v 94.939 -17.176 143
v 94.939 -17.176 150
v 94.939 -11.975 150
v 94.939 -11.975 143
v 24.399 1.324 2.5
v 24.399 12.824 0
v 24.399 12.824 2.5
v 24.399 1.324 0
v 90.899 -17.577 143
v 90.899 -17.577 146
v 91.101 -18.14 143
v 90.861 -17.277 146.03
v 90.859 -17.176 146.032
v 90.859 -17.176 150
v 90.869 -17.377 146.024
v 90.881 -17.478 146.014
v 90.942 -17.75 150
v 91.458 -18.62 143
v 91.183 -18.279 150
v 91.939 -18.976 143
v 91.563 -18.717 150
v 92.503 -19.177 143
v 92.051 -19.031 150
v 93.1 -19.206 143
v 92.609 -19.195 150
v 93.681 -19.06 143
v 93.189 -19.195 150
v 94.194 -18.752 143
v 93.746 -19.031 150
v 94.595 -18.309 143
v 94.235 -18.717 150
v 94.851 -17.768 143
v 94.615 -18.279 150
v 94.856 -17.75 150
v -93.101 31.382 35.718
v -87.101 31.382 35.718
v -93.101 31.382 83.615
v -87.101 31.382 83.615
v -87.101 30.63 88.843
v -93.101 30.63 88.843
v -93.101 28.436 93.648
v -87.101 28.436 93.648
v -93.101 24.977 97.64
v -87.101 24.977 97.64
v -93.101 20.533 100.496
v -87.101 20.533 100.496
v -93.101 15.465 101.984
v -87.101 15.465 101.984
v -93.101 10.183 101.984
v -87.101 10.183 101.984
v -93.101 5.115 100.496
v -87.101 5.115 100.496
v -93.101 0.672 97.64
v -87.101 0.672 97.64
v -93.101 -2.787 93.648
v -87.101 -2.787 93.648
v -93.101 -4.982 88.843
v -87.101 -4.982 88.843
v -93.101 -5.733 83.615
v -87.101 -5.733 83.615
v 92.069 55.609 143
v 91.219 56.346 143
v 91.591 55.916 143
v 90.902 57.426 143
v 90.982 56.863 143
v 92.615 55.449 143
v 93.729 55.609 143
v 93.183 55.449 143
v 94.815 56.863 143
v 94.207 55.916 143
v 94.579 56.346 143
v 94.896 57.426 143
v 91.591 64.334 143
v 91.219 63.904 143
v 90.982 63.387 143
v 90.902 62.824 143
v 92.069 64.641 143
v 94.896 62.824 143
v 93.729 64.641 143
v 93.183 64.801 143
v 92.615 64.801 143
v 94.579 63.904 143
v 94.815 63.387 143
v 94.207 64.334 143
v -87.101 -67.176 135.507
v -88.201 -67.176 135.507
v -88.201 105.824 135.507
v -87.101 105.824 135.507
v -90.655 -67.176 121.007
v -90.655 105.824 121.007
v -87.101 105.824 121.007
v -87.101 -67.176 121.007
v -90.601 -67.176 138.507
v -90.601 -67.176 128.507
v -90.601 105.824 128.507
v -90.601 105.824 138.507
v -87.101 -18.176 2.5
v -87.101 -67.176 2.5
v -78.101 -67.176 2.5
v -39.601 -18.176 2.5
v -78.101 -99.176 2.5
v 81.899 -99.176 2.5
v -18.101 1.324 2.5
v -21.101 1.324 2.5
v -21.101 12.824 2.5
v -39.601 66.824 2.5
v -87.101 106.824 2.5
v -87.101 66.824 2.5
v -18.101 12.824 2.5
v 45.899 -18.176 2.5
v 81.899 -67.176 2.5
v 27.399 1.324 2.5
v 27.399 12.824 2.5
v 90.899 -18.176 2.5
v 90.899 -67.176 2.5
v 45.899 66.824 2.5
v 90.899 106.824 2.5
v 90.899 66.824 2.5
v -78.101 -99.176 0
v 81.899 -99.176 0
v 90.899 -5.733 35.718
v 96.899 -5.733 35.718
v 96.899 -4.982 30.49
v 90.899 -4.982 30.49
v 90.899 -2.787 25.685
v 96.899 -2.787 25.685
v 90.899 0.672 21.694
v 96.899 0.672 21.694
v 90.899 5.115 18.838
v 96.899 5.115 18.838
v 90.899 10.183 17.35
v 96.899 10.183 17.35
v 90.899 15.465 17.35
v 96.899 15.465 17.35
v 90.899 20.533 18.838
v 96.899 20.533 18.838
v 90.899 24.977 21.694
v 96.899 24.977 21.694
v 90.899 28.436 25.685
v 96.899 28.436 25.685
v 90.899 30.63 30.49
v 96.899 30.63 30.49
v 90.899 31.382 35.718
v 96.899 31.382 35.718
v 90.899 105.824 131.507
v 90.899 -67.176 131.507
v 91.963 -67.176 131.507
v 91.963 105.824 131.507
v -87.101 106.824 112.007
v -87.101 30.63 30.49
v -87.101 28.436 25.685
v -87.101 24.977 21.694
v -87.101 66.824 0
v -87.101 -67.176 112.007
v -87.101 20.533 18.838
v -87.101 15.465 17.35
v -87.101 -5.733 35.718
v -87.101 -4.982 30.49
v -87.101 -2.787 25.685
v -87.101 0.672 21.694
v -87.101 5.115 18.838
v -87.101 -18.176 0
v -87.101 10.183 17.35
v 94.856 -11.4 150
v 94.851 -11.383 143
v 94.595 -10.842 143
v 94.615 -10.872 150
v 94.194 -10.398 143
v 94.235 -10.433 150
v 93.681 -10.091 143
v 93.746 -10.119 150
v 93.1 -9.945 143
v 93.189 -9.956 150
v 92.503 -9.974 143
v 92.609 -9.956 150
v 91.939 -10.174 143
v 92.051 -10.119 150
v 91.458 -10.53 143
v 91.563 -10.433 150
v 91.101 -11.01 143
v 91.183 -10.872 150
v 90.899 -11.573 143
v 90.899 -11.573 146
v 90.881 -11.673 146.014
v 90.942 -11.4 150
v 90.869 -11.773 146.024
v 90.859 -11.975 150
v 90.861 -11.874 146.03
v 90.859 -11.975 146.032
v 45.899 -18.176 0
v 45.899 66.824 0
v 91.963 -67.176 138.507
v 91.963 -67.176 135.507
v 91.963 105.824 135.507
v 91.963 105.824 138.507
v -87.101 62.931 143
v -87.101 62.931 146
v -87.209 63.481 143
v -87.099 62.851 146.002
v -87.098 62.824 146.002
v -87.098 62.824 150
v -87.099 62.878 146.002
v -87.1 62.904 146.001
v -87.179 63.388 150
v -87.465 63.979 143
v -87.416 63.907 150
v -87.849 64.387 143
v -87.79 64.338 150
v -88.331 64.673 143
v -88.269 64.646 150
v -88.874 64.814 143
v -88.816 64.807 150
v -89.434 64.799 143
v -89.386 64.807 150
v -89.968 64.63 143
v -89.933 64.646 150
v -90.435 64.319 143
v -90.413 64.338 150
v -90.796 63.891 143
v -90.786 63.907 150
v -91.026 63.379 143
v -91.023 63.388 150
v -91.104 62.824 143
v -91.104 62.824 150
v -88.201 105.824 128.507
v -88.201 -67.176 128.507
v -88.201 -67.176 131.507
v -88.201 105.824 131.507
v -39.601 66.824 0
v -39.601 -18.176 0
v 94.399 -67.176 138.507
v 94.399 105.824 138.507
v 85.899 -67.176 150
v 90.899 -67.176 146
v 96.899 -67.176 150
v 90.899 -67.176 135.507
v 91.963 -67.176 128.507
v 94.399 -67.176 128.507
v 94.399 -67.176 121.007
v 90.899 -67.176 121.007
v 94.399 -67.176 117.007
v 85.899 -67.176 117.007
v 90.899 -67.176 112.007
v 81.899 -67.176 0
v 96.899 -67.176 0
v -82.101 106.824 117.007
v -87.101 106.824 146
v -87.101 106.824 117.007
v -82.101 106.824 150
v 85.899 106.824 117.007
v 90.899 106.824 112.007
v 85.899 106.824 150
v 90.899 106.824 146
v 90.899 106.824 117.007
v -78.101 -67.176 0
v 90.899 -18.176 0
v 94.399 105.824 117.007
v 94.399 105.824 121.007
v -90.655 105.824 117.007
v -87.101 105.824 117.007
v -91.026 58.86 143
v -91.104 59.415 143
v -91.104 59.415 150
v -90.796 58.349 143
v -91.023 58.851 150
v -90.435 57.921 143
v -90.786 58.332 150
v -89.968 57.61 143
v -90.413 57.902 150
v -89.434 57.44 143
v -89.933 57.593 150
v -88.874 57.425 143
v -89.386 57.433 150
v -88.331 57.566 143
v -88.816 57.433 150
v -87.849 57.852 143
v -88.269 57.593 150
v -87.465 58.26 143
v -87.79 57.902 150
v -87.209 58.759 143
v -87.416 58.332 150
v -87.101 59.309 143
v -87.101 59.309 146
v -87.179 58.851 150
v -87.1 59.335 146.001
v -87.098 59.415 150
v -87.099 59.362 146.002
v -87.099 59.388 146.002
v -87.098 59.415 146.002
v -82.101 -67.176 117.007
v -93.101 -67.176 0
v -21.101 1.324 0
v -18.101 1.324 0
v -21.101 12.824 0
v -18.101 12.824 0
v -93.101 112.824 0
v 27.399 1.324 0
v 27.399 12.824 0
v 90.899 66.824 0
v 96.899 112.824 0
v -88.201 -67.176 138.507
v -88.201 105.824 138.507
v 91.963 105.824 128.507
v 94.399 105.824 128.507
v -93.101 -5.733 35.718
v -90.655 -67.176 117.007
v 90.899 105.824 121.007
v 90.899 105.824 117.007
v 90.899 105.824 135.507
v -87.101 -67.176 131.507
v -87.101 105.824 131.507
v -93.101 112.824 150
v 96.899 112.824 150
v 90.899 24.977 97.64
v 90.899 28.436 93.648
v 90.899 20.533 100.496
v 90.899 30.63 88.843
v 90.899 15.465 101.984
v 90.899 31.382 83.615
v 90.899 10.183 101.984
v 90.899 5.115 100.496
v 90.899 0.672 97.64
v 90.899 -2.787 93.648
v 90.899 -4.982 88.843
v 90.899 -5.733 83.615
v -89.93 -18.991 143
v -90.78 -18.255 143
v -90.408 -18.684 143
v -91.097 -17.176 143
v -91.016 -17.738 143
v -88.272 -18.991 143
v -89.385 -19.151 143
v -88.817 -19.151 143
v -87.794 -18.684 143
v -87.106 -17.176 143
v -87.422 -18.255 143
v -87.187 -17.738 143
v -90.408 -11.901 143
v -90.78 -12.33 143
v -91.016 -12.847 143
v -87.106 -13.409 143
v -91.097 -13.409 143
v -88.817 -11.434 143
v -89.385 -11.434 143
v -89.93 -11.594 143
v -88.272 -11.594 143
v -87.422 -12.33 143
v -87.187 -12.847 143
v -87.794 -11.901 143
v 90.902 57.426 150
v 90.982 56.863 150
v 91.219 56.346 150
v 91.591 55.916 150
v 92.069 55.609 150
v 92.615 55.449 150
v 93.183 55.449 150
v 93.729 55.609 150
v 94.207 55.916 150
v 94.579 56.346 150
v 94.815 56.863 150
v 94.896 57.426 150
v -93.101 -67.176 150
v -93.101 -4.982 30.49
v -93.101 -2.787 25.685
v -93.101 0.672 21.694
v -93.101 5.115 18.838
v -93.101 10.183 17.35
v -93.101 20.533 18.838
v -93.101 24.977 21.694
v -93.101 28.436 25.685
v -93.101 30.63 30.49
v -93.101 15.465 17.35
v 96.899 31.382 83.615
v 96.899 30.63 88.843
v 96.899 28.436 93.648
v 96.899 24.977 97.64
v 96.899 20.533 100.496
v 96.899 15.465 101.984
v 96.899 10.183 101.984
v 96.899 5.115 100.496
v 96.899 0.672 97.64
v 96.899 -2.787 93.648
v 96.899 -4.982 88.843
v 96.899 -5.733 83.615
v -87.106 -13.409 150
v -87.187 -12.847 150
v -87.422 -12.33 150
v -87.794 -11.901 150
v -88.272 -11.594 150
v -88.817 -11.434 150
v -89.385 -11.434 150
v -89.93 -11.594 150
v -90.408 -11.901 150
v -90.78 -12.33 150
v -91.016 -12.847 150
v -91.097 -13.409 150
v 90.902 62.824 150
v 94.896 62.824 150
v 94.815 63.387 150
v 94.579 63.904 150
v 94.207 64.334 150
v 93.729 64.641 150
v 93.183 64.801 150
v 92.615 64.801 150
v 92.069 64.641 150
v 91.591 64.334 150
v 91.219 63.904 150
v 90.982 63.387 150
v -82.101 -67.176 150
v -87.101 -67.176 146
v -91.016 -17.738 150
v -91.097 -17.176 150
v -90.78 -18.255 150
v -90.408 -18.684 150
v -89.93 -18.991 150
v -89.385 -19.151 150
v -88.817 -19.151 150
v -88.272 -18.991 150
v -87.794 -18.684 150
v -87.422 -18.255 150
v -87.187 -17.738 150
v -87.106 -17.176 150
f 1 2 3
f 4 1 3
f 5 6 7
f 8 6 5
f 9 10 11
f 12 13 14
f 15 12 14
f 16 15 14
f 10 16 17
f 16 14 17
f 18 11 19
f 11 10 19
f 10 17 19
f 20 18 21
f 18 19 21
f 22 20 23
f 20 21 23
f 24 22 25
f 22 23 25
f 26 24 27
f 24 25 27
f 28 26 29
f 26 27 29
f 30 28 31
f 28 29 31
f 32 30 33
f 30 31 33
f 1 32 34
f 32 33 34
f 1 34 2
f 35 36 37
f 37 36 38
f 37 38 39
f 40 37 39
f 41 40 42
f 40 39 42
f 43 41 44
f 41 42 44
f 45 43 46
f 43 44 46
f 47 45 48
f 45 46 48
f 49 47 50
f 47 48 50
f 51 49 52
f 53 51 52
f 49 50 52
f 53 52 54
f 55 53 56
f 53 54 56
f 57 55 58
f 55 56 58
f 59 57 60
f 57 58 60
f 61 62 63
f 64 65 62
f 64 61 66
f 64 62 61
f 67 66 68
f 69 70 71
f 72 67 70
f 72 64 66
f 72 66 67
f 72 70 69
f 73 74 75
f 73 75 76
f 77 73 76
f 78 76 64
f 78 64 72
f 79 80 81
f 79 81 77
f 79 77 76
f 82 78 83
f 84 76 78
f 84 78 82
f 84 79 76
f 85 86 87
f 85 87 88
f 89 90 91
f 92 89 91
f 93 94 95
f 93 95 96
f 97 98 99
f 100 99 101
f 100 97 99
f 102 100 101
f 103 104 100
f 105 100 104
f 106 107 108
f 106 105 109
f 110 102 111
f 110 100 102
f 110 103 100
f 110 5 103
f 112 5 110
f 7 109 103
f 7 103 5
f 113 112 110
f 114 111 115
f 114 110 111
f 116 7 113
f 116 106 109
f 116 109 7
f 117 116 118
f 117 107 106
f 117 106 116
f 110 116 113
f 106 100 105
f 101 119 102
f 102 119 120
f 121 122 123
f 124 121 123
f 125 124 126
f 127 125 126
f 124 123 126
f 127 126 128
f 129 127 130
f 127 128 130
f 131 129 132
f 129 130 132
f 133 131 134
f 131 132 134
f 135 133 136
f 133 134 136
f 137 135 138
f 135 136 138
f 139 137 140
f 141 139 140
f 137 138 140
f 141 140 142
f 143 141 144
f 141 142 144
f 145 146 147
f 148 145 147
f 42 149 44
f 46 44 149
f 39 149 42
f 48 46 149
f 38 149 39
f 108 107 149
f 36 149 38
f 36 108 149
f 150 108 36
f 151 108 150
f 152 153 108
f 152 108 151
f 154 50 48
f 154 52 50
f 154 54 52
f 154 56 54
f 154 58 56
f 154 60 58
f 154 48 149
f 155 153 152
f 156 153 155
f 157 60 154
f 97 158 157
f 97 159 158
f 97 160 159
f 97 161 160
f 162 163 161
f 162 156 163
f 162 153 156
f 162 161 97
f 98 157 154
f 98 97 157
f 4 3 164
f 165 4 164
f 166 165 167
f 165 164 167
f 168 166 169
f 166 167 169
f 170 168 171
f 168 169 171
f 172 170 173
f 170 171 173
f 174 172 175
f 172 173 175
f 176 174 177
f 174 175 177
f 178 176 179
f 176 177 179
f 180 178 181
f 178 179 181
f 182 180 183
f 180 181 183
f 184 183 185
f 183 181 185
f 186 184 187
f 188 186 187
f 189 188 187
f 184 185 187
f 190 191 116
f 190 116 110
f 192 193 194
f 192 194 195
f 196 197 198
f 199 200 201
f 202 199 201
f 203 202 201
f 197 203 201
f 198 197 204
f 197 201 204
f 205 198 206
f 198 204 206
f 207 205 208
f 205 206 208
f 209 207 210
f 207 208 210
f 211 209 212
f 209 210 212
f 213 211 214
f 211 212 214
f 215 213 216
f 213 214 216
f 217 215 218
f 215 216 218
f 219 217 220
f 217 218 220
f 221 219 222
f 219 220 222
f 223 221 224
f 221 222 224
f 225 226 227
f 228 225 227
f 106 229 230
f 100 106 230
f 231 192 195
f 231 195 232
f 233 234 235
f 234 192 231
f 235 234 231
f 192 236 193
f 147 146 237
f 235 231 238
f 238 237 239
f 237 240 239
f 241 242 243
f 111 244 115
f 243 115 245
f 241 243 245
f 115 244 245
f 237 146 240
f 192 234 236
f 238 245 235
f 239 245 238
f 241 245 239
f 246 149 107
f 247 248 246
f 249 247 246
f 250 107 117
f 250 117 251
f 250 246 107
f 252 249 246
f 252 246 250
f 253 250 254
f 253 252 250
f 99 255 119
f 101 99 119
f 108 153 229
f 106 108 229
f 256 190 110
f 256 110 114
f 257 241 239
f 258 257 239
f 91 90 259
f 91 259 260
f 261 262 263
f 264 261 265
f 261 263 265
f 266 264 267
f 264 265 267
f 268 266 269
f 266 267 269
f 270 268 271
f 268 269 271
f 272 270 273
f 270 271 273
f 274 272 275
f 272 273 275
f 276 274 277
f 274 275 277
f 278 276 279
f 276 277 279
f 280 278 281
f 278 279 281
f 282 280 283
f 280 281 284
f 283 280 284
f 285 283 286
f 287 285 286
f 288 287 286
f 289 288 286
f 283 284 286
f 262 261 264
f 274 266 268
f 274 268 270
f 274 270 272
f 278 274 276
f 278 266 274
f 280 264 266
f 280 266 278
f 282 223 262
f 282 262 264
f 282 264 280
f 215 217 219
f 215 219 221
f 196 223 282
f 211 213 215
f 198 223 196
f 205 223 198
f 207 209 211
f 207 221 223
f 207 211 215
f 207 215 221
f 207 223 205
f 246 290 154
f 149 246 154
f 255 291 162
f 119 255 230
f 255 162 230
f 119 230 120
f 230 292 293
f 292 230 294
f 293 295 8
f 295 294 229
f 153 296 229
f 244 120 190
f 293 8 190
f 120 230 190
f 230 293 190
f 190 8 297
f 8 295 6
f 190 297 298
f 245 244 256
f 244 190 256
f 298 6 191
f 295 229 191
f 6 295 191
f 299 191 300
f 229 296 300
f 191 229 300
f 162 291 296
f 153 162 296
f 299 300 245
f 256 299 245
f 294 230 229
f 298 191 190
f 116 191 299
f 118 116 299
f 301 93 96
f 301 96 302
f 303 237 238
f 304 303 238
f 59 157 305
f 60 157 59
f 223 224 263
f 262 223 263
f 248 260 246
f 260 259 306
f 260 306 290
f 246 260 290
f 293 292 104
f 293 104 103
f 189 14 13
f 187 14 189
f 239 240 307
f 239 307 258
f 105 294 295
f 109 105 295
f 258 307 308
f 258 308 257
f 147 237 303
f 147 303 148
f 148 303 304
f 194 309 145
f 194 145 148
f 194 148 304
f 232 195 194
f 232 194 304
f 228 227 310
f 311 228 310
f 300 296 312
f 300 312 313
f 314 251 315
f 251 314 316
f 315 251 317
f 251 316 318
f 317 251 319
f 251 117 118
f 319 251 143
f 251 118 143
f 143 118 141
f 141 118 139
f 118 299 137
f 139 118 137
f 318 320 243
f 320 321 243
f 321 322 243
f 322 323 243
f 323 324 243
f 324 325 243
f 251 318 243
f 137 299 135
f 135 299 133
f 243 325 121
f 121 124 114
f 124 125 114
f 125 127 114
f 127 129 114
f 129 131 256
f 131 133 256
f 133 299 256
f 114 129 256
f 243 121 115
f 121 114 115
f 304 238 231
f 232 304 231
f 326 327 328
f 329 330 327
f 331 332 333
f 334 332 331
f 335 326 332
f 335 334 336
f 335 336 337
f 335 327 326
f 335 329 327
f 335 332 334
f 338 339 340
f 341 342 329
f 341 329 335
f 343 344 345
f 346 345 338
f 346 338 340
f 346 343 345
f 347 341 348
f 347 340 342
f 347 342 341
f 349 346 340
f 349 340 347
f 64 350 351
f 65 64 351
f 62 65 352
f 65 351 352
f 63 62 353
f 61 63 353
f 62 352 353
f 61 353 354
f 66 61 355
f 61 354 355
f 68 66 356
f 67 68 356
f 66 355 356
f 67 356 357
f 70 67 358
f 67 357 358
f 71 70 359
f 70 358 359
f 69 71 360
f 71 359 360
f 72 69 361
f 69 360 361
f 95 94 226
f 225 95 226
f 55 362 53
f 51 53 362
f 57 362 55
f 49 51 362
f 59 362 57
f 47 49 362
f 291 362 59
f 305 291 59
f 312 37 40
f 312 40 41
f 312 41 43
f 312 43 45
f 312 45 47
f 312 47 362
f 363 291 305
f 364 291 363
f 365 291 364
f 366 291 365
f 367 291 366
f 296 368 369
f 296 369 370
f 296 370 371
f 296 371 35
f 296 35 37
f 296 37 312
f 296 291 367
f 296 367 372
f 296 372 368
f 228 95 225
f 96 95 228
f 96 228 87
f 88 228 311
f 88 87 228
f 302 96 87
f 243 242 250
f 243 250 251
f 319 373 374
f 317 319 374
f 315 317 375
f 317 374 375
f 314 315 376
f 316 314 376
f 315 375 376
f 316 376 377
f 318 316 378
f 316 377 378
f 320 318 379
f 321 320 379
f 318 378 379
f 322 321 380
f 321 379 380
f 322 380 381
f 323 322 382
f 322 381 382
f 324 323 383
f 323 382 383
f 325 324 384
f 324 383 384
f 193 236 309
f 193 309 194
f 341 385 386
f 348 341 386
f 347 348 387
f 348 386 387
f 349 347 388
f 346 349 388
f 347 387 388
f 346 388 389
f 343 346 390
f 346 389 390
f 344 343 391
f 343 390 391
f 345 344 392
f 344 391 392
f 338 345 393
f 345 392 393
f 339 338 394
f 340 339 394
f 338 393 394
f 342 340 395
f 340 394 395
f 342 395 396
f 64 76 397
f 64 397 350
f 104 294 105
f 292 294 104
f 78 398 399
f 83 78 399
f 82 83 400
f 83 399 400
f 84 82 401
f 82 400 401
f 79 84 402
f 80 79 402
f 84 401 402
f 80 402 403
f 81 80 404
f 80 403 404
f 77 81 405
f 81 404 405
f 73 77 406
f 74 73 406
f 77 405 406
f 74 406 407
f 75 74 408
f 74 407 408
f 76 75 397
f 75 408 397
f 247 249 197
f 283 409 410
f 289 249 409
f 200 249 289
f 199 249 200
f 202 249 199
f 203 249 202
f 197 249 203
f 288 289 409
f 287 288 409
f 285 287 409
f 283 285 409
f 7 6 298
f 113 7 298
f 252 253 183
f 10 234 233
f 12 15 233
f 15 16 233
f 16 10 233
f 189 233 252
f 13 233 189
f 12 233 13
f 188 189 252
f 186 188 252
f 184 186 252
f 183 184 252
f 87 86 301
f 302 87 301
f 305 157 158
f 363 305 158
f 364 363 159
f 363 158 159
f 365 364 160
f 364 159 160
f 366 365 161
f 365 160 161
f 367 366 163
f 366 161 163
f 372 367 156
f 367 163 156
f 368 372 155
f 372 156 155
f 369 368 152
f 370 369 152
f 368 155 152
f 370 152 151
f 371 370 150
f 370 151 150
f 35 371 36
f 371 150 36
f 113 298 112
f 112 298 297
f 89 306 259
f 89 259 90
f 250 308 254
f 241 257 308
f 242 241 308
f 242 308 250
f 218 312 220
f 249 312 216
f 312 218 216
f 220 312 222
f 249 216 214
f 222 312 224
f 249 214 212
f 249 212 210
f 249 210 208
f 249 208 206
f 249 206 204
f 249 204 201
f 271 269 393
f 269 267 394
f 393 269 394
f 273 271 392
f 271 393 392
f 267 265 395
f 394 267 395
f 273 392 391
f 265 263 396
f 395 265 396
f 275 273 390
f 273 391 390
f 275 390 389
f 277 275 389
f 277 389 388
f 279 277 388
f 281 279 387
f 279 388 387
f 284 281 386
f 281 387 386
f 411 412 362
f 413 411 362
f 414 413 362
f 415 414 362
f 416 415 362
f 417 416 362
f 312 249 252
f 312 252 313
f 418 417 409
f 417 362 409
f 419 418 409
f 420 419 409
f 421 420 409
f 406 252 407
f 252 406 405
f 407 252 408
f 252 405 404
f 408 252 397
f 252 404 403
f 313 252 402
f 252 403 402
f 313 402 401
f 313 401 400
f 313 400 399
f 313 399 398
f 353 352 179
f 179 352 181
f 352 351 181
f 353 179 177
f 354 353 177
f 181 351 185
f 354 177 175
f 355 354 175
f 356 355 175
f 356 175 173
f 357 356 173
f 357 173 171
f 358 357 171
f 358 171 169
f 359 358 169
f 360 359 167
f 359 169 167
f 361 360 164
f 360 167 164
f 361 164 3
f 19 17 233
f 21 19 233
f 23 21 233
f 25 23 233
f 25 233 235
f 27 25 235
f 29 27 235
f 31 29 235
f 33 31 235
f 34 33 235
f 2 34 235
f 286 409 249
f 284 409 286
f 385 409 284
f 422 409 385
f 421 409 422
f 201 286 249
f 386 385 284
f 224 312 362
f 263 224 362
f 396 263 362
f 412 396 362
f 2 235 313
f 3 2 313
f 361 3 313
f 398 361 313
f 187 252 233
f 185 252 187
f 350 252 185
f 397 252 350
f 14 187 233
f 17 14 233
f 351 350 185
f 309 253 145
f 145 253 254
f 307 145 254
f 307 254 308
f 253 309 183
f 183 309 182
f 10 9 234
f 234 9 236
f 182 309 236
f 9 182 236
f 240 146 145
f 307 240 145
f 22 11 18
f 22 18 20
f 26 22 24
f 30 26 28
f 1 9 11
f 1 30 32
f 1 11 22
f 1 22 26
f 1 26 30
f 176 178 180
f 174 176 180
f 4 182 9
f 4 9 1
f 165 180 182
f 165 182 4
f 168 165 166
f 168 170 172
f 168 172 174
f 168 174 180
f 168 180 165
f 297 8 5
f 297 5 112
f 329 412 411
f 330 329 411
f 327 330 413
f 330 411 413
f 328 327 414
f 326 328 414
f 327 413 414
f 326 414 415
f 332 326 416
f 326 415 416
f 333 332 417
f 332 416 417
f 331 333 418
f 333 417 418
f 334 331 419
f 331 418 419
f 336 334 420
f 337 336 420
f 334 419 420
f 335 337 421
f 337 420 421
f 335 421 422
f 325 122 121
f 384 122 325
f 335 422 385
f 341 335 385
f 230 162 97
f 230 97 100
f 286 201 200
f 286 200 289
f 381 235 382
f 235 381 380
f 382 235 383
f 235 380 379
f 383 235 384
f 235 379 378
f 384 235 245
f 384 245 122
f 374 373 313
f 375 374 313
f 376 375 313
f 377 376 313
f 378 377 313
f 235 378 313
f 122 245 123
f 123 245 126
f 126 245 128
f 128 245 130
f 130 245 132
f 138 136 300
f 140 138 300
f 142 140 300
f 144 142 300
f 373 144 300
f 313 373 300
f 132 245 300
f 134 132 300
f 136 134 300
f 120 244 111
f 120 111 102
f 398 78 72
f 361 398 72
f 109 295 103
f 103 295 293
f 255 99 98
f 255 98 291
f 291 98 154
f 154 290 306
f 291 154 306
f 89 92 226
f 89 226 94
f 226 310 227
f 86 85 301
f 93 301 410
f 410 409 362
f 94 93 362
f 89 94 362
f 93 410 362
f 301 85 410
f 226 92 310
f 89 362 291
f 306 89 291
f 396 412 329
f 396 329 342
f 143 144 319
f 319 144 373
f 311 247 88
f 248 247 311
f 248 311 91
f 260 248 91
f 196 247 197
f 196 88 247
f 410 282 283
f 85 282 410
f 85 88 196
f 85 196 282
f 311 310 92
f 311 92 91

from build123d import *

# Parameters (mm, degrees)
SKETCH_W        = 190
SKETCH_H        = 220
PAD_DEPTH       = 150
SKETCH001_W     = 178
SKETCH001_H     = 208
POCKET_DEPTH    = 147.5
SKETCH002_W     = 45
SKETCH002_H     = 85
SKETCH002_W_2   = 47.5
POCKET001_DEPTH = 100
SKETCH003_W     = 3
SKETCH003_H     = 11.5
POCKET002_DEPTH = 100
SKETCH004_W     = 15
SKETCH004_H     = 40
POCKET003_DEPTH = 150
SKETCH005_W     = 194.070648
SKETCH005_H     = 26.911476
POCKET004_DEPTH = 150.001
SKETCH006_W     = 2.43538
SKETCH006_H     = 10
SKETCH006_W_2   = 2.4
POCKET005_DEPTH = 173
SKETCH007_W     = 3.424065
SKETCH007_H     = 4
SKETCH007_W_2   = 3.834519
POCKET006_DEPTH = 173
SKETCH008_W     = 185.053348
SKETCH008_H     = 4
POCKET007_DEPTH = 173
PAD001_DEPTH    = 174
PAD002_DEPTH    = 174
POCKET008_DEPTH = 7
POCKET009_DEPTH = 200


with BuildPart() as part:
    # Sketch → Pad (new body)
    with BuildSketch(Plane.XY):
        with Locations((1.898805, 2.824203)):
            Rectangle(SKETCH_W, SKETCH_H)
    extrude(amount=PAD_DEPTH)

    # Sketch001 (on Face6 of Pad) → Pocket (cut)
    with BuildSketch(Plane.XY.offset(150)):
        with Locations((1.898805, 2.824203)):
            Rectangle(SKETCH001_W, SKETCH001_H)
    extrude(amount=-POCKET_DEPTH, mode=Mode.SUBTRACT)

    # Sketch002 (on Face4 of Pocket) → Pocket001 (cut)
    with BuildSketch(Plane(origin=(0, 0, 0), x_dir=(1, 0, 0), z_dir=(0, 0, -1))):
        with Locations((68.398805, -24.324203)):
            Rectangle(SKETCH002_W, SKETCH002_H)
        with Locations((-63.351195, -24.324203)):
            Rectangle(SKETCH002_W_2, SKETCH002_H)
    extrude(amount=-POCKET001_DEPTH, mode=Mode.SUBTRACT)

    # Sketch003 (on Face4 of Pocket001) → Pocket002 (cut)
    with BuildSketch(Plane(origin=(0, 0, 0), x_dir=(1, 0, 0), z_dir=(0, 0, -1))):
        with Locations((-19.601195, -7.074203)):
            Rectangle(SKETCH003_W, SKETCH003_H)
        with Locations((25.898805, -7.074203)):
            Rectangle(SKETCH003_W, SKETCH003_H)
    extrude(amount=-POCKET002_DEPTH, mode=Mode.SUBTRACT)

    # Sketch004 (on Face4 of Pocket002) → Pocket003 (cut)
    with BuildSketch(Plane(origin=(0, 0, 0), x_dir=(1, 0, 0), z_dir=(0, 0, -1))):
        with Locations((-85.601195, 87.175797)):
            Rectangle(SKETCH004_W, SKETCH004_H)
        with Locations((89.398805, 87.175797)):
            Rectangle(SKETCH004_W, SKETCH004_H)
    extrude(amount=-POCKET003_DEPTH, mode=Mode.SUBTRACT)

    # Sketch005 (on Face2 of Pocket003) → Pocket004 (cut, through all)
    with BuildSketch(Plane(origin=(0, 0, 0), x_dir=(1, 0, 0), z_dir=(0, 0, -1))):
        with Locations((-2.19445, 112.631535)):
            Rectangle(SKETCH005_W, SKETCH005_H)
    extrude(amount=-POCKET004_DEPTH, mode=Mode.SUBTRACT)

    # Sketch006 (on DatumPlane) → Pocket005 (cut)
    with BuildSketch(Plane.XZ.offset(67.175797)):
        with Locations((93.181115, 133.506973)):
            Rectangle(SKETCH006_W, SKETCH006_H)
        with Locations((-89.401195, 133.506973)):
            Rectangle(SKETCH006_W_2, SKETCH006_H)
    extrude(amount=-POCKET005_DEPTH, mode=Mode.SUBTRACT)

    # Sketch007 (on DatumPlane) → Pocket006 (cut)
    with BuildSketch(Plane.XZ.offset(67.175797)):
        with Locations((-87.572056, 133.506973)):
            Rectangle(SKETCH007_W, SKETCH007_H)
        with Locations((91.170921, 133.506973)):
            Rectangle(SKETCH007_W_2, SKETCH007_H)
    extrude(amount=-POCKET006_DEPTH, mode=Mode.SUBTRACT)

    # Sketch008 (on DatumPlane) → Pocket007 (cut)
    with BuildSketch(Plane.XZ.offset(67.175797)):
        with Locations((1.872131, 119.006973)):
            Rectangle(SKETCH008_W, SKETCH008_H)
    extrude(amount=-POCKET007_DEPTH, mode=Mode.SUBTRACT)

    # Sketch009 (on DatumPlane) → Pad001 (join)
    with BuildSketch(Plane.XZ.offset(67.175797)):
        Polygon((-87.101195, 117.006973), (-82.101195, 117.006973), (-87.101195, 112.006973), align=None)
        Polygon((90.898805, 117.006973), (85.898805, 117.006973), (90.898805, 112.006973), align=None)
    extrude(amount=-PAD001_DEPTH)

    # Sketch011 (on DatumPlane) → Pad002 (join)
    with BuildSketch(Plane.XZ.offset(67.175797)):
        Polygon((-87.101195, 150), (-82.101195, 150), (-87.101195, 146), align=None)
        Polygon((90.898805, 150), (90.898805, 146), (85.898805, 150), align=None)
    extrude(amount=-PAD002_DEPTH)

    # Sketch013 (on DatumPlane) → Pocket008 (cut)
    with BuildSketch(Plane.XY.offset(150)):
        with BuildLine():
            ThreePointArc((-87.098357, 62.824203), (-89.101195, 64.827042), (-91.104034, 62.824203))
            Line((-91.104034, 62.824203), (-91.104034, 59.41515))
            ThreePointArc((-91.104034, 59.41515), (-89.101195, 57.412311), (-87.098357, 59.41515))
            Line((-87.098357, 62.824203), (-87.098357, 59.41515))
        make_face()
        with BuildLine():
            ThreePointArc((-91.096694, -17.175797), (-89.101195, -19.171295), (-87.105697, -17.175797))
            Line((-87.105697, -17.175797), (-87.105697, -13.409031))
            ThreePointArc((-87.105697, -13.409031), (-89.101195, -11.413533), (-91.096694, -13.409031))
            Line((-91.096694, -17.175797), (-91.096694, -13.409031))
        make_face()
        with BuildLine():
            ThreePointArc((90.858933, -17.175797), (92.898805, -19.215669), (94.938676, -17.175797))
            Line((94.938676, -17.175797), (94.938676, -11.974619))
            ThreePointArc((94.938676, -11.974619), (92.898805, -9.934747), (90.858933, -11.974619))
            Line((90.858933, -17.175797), (90.858933, -11.974619))
        make_face()
        with BuildLine():
            ThreePointArc((94.89608, 62.824203), (92.898805, 64.821478), (90.901529, 62.824203))
            Line((90.901529, 62.824203), (90.901529, 57.425644))
            ThreePointArc((90.901529, 57.425644), (92.898805, 55.428369), (94.89608, 57.425644))
            Line((94.89608, 62.824203), (94.89608, 57.425644))
        make_face()
    extrude(amount=-POCKET008_DEPTH, mode=Mode.SUBTRACT)

    # Sketch019 (on Face6 of Pocket008) → Pocket009 (cut)
    with BuildSketch(Plane.YZ.offset(96.898805)):
        with BuildLine():
            ThreePointArc((-5.733227, 35.71838), (12.824203, 17.16095), (31.381633, 35.71838))
            Line((31.381633, 35.71838), (31.381633, 83.615097))
            ThreePointArc((31.381633, 83.615097), (12.824203, 102.172527), (-5.733227, 83.615097))
            Line((-5.733227, 35.71838), (-5.733227, 83.615097))
        make_face()
    extrude(amount=-POCKET009_DEPTH, mode=Mode.SUBTRACT)


solid = part.part
